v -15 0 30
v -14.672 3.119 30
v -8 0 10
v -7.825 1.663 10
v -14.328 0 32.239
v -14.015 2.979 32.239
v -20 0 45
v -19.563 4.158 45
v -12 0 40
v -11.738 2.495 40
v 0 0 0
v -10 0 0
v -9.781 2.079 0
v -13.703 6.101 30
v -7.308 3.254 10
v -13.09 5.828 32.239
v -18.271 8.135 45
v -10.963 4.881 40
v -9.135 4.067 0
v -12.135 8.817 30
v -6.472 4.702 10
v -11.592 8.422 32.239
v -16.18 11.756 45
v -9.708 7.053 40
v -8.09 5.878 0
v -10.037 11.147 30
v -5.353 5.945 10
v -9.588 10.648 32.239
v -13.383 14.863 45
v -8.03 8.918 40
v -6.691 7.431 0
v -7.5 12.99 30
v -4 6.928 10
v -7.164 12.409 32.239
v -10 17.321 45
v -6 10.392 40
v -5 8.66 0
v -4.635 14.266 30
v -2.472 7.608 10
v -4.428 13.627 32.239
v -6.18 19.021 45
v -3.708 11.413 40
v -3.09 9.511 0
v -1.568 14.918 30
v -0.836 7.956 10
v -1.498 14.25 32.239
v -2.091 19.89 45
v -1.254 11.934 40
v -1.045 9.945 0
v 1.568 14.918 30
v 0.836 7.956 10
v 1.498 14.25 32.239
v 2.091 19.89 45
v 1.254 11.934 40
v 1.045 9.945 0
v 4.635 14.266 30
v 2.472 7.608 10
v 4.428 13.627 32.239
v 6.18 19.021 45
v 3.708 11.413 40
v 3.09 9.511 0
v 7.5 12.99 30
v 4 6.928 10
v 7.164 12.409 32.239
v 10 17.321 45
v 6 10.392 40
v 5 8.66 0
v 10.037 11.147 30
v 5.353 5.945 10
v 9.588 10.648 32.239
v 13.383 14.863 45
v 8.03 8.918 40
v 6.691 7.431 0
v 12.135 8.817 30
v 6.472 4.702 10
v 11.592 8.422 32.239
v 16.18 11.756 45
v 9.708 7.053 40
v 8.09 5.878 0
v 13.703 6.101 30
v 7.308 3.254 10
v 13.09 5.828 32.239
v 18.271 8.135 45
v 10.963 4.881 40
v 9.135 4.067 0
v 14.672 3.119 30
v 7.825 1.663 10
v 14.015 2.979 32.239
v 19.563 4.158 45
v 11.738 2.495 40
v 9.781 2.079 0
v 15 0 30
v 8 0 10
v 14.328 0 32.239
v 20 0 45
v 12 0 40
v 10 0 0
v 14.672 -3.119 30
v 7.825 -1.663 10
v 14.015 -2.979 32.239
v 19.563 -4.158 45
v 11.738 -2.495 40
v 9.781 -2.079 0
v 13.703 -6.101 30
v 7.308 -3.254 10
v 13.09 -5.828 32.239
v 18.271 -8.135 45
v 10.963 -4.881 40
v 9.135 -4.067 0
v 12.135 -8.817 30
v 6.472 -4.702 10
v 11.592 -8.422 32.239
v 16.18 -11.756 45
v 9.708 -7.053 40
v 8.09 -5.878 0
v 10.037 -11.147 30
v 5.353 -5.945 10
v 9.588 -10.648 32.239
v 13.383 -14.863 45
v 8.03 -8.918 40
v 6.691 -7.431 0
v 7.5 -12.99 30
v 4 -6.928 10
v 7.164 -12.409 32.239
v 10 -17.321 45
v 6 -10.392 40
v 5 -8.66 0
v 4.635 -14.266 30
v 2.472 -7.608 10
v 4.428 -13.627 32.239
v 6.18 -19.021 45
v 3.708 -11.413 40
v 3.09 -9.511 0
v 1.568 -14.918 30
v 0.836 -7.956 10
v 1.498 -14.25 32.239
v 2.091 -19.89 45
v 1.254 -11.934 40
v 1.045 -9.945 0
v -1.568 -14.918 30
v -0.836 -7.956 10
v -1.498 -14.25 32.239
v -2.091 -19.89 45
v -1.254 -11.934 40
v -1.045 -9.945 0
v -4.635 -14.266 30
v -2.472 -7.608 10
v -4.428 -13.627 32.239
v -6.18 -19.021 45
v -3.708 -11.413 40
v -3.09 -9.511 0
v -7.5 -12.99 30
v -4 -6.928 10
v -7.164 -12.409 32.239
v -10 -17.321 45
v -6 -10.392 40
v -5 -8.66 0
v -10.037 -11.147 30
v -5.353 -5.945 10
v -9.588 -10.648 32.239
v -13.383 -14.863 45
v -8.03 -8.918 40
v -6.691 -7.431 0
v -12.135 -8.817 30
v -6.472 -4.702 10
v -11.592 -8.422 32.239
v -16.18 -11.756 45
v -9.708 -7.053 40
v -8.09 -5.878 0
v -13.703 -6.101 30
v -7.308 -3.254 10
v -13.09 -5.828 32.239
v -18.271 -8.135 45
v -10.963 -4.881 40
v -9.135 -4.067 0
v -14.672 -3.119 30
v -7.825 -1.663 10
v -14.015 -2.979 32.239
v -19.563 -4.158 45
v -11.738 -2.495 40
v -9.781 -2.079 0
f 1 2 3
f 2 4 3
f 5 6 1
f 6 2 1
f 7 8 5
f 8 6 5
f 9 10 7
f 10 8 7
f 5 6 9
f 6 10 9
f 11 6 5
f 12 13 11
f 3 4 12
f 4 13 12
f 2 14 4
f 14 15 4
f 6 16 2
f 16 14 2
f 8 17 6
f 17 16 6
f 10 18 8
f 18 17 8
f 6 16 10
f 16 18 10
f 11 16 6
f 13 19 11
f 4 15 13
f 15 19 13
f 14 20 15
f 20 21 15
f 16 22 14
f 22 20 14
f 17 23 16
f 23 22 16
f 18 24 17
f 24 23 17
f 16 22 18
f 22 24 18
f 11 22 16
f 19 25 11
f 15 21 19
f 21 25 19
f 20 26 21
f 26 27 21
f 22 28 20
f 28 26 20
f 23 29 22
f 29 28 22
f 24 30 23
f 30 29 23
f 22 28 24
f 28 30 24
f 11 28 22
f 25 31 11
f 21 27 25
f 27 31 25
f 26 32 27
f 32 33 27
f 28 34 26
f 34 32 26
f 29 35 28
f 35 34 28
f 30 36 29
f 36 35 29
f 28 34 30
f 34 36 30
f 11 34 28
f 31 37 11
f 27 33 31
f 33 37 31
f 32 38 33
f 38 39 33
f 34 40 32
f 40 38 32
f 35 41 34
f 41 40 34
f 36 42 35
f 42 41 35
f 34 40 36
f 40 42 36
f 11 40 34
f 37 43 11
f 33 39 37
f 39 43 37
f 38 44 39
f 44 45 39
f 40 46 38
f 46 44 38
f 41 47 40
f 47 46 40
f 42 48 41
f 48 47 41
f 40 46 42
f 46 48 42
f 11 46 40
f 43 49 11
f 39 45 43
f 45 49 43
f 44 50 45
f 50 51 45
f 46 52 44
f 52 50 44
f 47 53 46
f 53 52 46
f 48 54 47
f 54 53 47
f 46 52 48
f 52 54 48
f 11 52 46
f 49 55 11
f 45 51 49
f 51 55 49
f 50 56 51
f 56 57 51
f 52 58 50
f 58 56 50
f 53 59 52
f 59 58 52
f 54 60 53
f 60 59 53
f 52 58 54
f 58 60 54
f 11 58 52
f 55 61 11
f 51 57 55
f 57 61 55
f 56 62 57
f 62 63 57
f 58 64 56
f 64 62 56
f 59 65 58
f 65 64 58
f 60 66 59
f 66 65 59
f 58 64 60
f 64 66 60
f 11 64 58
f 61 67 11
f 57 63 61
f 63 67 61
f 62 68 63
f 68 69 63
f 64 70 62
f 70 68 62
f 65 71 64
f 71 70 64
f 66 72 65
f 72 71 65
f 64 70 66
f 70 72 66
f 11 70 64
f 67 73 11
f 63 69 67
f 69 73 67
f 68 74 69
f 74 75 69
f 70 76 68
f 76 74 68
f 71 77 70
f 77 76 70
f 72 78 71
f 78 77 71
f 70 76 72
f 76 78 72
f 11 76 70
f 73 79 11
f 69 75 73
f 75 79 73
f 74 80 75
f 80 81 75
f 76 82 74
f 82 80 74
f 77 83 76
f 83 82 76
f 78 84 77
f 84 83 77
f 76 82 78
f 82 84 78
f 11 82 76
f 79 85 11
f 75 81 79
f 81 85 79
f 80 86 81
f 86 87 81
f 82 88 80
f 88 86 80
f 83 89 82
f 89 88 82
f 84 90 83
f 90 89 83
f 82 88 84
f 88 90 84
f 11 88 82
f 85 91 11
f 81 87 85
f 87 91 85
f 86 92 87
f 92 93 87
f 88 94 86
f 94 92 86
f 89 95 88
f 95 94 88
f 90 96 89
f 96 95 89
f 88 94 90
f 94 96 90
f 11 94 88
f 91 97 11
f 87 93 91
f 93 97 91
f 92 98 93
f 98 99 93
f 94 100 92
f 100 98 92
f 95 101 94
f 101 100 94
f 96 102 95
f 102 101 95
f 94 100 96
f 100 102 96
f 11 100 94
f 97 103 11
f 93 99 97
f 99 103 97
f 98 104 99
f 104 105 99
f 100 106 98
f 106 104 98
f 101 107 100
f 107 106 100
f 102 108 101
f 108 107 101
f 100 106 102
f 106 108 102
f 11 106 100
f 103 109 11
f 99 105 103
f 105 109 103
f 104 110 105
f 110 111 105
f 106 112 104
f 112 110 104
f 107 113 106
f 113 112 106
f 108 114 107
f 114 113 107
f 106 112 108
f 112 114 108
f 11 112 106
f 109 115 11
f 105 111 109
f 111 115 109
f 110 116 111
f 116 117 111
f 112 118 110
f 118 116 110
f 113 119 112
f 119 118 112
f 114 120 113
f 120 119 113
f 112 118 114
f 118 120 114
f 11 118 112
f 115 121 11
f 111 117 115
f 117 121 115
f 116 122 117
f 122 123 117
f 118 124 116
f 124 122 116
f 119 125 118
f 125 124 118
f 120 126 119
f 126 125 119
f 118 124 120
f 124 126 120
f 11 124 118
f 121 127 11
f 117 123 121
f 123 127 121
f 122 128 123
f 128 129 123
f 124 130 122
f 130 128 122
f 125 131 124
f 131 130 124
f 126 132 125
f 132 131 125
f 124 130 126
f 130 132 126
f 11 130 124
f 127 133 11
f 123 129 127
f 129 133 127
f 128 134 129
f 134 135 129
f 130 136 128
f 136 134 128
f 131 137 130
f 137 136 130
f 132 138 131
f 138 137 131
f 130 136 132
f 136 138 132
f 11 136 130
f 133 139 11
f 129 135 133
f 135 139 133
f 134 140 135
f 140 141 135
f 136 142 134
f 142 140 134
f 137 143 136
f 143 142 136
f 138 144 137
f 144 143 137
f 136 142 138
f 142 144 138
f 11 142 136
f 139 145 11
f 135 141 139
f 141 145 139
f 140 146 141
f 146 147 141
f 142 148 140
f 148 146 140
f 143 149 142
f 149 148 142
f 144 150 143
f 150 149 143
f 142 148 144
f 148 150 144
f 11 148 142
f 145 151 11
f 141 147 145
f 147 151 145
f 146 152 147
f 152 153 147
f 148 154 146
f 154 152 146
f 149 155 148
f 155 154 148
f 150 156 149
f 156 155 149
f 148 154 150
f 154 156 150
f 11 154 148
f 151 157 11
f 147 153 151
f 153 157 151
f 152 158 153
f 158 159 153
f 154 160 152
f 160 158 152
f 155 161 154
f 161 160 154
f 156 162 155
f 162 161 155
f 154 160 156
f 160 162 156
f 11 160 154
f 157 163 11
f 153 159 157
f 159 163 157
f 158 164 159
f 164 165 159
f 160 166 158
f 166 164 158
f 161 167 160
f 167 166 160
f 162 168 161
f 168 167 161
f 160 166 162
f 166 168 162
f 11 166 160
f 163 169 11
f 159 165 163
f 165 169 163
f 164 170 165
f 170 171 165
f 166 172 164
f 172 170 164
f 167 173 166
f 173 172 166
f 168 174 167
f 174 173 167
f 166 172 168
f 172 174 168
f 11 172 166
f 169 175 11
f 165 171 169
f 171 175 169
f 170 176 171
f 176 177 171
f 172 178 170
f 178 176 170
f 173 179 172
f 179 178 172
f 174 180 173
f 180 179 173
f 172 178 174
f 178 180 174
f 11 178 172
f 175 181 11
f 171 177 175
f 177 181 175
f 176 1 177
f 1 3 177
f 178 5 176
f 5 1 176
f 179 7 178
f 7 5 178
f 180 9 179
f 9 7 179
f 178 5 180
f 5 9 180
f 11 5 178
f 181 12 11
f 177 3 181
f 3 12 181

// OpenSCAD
// Vase Profile Points
vase_profile = [
    [0, 0],      // Base center
    [10, 0],     // Base radius
    [8, 10],     // Narrow section
    [15, 30],    // Mid body
    [12, 40],    // Neck
    [20, 45]     // Top
];

// Rotational extrusion to form vase
rotate_extrude(angle = 360)
    polygon(points = vase_profile);
